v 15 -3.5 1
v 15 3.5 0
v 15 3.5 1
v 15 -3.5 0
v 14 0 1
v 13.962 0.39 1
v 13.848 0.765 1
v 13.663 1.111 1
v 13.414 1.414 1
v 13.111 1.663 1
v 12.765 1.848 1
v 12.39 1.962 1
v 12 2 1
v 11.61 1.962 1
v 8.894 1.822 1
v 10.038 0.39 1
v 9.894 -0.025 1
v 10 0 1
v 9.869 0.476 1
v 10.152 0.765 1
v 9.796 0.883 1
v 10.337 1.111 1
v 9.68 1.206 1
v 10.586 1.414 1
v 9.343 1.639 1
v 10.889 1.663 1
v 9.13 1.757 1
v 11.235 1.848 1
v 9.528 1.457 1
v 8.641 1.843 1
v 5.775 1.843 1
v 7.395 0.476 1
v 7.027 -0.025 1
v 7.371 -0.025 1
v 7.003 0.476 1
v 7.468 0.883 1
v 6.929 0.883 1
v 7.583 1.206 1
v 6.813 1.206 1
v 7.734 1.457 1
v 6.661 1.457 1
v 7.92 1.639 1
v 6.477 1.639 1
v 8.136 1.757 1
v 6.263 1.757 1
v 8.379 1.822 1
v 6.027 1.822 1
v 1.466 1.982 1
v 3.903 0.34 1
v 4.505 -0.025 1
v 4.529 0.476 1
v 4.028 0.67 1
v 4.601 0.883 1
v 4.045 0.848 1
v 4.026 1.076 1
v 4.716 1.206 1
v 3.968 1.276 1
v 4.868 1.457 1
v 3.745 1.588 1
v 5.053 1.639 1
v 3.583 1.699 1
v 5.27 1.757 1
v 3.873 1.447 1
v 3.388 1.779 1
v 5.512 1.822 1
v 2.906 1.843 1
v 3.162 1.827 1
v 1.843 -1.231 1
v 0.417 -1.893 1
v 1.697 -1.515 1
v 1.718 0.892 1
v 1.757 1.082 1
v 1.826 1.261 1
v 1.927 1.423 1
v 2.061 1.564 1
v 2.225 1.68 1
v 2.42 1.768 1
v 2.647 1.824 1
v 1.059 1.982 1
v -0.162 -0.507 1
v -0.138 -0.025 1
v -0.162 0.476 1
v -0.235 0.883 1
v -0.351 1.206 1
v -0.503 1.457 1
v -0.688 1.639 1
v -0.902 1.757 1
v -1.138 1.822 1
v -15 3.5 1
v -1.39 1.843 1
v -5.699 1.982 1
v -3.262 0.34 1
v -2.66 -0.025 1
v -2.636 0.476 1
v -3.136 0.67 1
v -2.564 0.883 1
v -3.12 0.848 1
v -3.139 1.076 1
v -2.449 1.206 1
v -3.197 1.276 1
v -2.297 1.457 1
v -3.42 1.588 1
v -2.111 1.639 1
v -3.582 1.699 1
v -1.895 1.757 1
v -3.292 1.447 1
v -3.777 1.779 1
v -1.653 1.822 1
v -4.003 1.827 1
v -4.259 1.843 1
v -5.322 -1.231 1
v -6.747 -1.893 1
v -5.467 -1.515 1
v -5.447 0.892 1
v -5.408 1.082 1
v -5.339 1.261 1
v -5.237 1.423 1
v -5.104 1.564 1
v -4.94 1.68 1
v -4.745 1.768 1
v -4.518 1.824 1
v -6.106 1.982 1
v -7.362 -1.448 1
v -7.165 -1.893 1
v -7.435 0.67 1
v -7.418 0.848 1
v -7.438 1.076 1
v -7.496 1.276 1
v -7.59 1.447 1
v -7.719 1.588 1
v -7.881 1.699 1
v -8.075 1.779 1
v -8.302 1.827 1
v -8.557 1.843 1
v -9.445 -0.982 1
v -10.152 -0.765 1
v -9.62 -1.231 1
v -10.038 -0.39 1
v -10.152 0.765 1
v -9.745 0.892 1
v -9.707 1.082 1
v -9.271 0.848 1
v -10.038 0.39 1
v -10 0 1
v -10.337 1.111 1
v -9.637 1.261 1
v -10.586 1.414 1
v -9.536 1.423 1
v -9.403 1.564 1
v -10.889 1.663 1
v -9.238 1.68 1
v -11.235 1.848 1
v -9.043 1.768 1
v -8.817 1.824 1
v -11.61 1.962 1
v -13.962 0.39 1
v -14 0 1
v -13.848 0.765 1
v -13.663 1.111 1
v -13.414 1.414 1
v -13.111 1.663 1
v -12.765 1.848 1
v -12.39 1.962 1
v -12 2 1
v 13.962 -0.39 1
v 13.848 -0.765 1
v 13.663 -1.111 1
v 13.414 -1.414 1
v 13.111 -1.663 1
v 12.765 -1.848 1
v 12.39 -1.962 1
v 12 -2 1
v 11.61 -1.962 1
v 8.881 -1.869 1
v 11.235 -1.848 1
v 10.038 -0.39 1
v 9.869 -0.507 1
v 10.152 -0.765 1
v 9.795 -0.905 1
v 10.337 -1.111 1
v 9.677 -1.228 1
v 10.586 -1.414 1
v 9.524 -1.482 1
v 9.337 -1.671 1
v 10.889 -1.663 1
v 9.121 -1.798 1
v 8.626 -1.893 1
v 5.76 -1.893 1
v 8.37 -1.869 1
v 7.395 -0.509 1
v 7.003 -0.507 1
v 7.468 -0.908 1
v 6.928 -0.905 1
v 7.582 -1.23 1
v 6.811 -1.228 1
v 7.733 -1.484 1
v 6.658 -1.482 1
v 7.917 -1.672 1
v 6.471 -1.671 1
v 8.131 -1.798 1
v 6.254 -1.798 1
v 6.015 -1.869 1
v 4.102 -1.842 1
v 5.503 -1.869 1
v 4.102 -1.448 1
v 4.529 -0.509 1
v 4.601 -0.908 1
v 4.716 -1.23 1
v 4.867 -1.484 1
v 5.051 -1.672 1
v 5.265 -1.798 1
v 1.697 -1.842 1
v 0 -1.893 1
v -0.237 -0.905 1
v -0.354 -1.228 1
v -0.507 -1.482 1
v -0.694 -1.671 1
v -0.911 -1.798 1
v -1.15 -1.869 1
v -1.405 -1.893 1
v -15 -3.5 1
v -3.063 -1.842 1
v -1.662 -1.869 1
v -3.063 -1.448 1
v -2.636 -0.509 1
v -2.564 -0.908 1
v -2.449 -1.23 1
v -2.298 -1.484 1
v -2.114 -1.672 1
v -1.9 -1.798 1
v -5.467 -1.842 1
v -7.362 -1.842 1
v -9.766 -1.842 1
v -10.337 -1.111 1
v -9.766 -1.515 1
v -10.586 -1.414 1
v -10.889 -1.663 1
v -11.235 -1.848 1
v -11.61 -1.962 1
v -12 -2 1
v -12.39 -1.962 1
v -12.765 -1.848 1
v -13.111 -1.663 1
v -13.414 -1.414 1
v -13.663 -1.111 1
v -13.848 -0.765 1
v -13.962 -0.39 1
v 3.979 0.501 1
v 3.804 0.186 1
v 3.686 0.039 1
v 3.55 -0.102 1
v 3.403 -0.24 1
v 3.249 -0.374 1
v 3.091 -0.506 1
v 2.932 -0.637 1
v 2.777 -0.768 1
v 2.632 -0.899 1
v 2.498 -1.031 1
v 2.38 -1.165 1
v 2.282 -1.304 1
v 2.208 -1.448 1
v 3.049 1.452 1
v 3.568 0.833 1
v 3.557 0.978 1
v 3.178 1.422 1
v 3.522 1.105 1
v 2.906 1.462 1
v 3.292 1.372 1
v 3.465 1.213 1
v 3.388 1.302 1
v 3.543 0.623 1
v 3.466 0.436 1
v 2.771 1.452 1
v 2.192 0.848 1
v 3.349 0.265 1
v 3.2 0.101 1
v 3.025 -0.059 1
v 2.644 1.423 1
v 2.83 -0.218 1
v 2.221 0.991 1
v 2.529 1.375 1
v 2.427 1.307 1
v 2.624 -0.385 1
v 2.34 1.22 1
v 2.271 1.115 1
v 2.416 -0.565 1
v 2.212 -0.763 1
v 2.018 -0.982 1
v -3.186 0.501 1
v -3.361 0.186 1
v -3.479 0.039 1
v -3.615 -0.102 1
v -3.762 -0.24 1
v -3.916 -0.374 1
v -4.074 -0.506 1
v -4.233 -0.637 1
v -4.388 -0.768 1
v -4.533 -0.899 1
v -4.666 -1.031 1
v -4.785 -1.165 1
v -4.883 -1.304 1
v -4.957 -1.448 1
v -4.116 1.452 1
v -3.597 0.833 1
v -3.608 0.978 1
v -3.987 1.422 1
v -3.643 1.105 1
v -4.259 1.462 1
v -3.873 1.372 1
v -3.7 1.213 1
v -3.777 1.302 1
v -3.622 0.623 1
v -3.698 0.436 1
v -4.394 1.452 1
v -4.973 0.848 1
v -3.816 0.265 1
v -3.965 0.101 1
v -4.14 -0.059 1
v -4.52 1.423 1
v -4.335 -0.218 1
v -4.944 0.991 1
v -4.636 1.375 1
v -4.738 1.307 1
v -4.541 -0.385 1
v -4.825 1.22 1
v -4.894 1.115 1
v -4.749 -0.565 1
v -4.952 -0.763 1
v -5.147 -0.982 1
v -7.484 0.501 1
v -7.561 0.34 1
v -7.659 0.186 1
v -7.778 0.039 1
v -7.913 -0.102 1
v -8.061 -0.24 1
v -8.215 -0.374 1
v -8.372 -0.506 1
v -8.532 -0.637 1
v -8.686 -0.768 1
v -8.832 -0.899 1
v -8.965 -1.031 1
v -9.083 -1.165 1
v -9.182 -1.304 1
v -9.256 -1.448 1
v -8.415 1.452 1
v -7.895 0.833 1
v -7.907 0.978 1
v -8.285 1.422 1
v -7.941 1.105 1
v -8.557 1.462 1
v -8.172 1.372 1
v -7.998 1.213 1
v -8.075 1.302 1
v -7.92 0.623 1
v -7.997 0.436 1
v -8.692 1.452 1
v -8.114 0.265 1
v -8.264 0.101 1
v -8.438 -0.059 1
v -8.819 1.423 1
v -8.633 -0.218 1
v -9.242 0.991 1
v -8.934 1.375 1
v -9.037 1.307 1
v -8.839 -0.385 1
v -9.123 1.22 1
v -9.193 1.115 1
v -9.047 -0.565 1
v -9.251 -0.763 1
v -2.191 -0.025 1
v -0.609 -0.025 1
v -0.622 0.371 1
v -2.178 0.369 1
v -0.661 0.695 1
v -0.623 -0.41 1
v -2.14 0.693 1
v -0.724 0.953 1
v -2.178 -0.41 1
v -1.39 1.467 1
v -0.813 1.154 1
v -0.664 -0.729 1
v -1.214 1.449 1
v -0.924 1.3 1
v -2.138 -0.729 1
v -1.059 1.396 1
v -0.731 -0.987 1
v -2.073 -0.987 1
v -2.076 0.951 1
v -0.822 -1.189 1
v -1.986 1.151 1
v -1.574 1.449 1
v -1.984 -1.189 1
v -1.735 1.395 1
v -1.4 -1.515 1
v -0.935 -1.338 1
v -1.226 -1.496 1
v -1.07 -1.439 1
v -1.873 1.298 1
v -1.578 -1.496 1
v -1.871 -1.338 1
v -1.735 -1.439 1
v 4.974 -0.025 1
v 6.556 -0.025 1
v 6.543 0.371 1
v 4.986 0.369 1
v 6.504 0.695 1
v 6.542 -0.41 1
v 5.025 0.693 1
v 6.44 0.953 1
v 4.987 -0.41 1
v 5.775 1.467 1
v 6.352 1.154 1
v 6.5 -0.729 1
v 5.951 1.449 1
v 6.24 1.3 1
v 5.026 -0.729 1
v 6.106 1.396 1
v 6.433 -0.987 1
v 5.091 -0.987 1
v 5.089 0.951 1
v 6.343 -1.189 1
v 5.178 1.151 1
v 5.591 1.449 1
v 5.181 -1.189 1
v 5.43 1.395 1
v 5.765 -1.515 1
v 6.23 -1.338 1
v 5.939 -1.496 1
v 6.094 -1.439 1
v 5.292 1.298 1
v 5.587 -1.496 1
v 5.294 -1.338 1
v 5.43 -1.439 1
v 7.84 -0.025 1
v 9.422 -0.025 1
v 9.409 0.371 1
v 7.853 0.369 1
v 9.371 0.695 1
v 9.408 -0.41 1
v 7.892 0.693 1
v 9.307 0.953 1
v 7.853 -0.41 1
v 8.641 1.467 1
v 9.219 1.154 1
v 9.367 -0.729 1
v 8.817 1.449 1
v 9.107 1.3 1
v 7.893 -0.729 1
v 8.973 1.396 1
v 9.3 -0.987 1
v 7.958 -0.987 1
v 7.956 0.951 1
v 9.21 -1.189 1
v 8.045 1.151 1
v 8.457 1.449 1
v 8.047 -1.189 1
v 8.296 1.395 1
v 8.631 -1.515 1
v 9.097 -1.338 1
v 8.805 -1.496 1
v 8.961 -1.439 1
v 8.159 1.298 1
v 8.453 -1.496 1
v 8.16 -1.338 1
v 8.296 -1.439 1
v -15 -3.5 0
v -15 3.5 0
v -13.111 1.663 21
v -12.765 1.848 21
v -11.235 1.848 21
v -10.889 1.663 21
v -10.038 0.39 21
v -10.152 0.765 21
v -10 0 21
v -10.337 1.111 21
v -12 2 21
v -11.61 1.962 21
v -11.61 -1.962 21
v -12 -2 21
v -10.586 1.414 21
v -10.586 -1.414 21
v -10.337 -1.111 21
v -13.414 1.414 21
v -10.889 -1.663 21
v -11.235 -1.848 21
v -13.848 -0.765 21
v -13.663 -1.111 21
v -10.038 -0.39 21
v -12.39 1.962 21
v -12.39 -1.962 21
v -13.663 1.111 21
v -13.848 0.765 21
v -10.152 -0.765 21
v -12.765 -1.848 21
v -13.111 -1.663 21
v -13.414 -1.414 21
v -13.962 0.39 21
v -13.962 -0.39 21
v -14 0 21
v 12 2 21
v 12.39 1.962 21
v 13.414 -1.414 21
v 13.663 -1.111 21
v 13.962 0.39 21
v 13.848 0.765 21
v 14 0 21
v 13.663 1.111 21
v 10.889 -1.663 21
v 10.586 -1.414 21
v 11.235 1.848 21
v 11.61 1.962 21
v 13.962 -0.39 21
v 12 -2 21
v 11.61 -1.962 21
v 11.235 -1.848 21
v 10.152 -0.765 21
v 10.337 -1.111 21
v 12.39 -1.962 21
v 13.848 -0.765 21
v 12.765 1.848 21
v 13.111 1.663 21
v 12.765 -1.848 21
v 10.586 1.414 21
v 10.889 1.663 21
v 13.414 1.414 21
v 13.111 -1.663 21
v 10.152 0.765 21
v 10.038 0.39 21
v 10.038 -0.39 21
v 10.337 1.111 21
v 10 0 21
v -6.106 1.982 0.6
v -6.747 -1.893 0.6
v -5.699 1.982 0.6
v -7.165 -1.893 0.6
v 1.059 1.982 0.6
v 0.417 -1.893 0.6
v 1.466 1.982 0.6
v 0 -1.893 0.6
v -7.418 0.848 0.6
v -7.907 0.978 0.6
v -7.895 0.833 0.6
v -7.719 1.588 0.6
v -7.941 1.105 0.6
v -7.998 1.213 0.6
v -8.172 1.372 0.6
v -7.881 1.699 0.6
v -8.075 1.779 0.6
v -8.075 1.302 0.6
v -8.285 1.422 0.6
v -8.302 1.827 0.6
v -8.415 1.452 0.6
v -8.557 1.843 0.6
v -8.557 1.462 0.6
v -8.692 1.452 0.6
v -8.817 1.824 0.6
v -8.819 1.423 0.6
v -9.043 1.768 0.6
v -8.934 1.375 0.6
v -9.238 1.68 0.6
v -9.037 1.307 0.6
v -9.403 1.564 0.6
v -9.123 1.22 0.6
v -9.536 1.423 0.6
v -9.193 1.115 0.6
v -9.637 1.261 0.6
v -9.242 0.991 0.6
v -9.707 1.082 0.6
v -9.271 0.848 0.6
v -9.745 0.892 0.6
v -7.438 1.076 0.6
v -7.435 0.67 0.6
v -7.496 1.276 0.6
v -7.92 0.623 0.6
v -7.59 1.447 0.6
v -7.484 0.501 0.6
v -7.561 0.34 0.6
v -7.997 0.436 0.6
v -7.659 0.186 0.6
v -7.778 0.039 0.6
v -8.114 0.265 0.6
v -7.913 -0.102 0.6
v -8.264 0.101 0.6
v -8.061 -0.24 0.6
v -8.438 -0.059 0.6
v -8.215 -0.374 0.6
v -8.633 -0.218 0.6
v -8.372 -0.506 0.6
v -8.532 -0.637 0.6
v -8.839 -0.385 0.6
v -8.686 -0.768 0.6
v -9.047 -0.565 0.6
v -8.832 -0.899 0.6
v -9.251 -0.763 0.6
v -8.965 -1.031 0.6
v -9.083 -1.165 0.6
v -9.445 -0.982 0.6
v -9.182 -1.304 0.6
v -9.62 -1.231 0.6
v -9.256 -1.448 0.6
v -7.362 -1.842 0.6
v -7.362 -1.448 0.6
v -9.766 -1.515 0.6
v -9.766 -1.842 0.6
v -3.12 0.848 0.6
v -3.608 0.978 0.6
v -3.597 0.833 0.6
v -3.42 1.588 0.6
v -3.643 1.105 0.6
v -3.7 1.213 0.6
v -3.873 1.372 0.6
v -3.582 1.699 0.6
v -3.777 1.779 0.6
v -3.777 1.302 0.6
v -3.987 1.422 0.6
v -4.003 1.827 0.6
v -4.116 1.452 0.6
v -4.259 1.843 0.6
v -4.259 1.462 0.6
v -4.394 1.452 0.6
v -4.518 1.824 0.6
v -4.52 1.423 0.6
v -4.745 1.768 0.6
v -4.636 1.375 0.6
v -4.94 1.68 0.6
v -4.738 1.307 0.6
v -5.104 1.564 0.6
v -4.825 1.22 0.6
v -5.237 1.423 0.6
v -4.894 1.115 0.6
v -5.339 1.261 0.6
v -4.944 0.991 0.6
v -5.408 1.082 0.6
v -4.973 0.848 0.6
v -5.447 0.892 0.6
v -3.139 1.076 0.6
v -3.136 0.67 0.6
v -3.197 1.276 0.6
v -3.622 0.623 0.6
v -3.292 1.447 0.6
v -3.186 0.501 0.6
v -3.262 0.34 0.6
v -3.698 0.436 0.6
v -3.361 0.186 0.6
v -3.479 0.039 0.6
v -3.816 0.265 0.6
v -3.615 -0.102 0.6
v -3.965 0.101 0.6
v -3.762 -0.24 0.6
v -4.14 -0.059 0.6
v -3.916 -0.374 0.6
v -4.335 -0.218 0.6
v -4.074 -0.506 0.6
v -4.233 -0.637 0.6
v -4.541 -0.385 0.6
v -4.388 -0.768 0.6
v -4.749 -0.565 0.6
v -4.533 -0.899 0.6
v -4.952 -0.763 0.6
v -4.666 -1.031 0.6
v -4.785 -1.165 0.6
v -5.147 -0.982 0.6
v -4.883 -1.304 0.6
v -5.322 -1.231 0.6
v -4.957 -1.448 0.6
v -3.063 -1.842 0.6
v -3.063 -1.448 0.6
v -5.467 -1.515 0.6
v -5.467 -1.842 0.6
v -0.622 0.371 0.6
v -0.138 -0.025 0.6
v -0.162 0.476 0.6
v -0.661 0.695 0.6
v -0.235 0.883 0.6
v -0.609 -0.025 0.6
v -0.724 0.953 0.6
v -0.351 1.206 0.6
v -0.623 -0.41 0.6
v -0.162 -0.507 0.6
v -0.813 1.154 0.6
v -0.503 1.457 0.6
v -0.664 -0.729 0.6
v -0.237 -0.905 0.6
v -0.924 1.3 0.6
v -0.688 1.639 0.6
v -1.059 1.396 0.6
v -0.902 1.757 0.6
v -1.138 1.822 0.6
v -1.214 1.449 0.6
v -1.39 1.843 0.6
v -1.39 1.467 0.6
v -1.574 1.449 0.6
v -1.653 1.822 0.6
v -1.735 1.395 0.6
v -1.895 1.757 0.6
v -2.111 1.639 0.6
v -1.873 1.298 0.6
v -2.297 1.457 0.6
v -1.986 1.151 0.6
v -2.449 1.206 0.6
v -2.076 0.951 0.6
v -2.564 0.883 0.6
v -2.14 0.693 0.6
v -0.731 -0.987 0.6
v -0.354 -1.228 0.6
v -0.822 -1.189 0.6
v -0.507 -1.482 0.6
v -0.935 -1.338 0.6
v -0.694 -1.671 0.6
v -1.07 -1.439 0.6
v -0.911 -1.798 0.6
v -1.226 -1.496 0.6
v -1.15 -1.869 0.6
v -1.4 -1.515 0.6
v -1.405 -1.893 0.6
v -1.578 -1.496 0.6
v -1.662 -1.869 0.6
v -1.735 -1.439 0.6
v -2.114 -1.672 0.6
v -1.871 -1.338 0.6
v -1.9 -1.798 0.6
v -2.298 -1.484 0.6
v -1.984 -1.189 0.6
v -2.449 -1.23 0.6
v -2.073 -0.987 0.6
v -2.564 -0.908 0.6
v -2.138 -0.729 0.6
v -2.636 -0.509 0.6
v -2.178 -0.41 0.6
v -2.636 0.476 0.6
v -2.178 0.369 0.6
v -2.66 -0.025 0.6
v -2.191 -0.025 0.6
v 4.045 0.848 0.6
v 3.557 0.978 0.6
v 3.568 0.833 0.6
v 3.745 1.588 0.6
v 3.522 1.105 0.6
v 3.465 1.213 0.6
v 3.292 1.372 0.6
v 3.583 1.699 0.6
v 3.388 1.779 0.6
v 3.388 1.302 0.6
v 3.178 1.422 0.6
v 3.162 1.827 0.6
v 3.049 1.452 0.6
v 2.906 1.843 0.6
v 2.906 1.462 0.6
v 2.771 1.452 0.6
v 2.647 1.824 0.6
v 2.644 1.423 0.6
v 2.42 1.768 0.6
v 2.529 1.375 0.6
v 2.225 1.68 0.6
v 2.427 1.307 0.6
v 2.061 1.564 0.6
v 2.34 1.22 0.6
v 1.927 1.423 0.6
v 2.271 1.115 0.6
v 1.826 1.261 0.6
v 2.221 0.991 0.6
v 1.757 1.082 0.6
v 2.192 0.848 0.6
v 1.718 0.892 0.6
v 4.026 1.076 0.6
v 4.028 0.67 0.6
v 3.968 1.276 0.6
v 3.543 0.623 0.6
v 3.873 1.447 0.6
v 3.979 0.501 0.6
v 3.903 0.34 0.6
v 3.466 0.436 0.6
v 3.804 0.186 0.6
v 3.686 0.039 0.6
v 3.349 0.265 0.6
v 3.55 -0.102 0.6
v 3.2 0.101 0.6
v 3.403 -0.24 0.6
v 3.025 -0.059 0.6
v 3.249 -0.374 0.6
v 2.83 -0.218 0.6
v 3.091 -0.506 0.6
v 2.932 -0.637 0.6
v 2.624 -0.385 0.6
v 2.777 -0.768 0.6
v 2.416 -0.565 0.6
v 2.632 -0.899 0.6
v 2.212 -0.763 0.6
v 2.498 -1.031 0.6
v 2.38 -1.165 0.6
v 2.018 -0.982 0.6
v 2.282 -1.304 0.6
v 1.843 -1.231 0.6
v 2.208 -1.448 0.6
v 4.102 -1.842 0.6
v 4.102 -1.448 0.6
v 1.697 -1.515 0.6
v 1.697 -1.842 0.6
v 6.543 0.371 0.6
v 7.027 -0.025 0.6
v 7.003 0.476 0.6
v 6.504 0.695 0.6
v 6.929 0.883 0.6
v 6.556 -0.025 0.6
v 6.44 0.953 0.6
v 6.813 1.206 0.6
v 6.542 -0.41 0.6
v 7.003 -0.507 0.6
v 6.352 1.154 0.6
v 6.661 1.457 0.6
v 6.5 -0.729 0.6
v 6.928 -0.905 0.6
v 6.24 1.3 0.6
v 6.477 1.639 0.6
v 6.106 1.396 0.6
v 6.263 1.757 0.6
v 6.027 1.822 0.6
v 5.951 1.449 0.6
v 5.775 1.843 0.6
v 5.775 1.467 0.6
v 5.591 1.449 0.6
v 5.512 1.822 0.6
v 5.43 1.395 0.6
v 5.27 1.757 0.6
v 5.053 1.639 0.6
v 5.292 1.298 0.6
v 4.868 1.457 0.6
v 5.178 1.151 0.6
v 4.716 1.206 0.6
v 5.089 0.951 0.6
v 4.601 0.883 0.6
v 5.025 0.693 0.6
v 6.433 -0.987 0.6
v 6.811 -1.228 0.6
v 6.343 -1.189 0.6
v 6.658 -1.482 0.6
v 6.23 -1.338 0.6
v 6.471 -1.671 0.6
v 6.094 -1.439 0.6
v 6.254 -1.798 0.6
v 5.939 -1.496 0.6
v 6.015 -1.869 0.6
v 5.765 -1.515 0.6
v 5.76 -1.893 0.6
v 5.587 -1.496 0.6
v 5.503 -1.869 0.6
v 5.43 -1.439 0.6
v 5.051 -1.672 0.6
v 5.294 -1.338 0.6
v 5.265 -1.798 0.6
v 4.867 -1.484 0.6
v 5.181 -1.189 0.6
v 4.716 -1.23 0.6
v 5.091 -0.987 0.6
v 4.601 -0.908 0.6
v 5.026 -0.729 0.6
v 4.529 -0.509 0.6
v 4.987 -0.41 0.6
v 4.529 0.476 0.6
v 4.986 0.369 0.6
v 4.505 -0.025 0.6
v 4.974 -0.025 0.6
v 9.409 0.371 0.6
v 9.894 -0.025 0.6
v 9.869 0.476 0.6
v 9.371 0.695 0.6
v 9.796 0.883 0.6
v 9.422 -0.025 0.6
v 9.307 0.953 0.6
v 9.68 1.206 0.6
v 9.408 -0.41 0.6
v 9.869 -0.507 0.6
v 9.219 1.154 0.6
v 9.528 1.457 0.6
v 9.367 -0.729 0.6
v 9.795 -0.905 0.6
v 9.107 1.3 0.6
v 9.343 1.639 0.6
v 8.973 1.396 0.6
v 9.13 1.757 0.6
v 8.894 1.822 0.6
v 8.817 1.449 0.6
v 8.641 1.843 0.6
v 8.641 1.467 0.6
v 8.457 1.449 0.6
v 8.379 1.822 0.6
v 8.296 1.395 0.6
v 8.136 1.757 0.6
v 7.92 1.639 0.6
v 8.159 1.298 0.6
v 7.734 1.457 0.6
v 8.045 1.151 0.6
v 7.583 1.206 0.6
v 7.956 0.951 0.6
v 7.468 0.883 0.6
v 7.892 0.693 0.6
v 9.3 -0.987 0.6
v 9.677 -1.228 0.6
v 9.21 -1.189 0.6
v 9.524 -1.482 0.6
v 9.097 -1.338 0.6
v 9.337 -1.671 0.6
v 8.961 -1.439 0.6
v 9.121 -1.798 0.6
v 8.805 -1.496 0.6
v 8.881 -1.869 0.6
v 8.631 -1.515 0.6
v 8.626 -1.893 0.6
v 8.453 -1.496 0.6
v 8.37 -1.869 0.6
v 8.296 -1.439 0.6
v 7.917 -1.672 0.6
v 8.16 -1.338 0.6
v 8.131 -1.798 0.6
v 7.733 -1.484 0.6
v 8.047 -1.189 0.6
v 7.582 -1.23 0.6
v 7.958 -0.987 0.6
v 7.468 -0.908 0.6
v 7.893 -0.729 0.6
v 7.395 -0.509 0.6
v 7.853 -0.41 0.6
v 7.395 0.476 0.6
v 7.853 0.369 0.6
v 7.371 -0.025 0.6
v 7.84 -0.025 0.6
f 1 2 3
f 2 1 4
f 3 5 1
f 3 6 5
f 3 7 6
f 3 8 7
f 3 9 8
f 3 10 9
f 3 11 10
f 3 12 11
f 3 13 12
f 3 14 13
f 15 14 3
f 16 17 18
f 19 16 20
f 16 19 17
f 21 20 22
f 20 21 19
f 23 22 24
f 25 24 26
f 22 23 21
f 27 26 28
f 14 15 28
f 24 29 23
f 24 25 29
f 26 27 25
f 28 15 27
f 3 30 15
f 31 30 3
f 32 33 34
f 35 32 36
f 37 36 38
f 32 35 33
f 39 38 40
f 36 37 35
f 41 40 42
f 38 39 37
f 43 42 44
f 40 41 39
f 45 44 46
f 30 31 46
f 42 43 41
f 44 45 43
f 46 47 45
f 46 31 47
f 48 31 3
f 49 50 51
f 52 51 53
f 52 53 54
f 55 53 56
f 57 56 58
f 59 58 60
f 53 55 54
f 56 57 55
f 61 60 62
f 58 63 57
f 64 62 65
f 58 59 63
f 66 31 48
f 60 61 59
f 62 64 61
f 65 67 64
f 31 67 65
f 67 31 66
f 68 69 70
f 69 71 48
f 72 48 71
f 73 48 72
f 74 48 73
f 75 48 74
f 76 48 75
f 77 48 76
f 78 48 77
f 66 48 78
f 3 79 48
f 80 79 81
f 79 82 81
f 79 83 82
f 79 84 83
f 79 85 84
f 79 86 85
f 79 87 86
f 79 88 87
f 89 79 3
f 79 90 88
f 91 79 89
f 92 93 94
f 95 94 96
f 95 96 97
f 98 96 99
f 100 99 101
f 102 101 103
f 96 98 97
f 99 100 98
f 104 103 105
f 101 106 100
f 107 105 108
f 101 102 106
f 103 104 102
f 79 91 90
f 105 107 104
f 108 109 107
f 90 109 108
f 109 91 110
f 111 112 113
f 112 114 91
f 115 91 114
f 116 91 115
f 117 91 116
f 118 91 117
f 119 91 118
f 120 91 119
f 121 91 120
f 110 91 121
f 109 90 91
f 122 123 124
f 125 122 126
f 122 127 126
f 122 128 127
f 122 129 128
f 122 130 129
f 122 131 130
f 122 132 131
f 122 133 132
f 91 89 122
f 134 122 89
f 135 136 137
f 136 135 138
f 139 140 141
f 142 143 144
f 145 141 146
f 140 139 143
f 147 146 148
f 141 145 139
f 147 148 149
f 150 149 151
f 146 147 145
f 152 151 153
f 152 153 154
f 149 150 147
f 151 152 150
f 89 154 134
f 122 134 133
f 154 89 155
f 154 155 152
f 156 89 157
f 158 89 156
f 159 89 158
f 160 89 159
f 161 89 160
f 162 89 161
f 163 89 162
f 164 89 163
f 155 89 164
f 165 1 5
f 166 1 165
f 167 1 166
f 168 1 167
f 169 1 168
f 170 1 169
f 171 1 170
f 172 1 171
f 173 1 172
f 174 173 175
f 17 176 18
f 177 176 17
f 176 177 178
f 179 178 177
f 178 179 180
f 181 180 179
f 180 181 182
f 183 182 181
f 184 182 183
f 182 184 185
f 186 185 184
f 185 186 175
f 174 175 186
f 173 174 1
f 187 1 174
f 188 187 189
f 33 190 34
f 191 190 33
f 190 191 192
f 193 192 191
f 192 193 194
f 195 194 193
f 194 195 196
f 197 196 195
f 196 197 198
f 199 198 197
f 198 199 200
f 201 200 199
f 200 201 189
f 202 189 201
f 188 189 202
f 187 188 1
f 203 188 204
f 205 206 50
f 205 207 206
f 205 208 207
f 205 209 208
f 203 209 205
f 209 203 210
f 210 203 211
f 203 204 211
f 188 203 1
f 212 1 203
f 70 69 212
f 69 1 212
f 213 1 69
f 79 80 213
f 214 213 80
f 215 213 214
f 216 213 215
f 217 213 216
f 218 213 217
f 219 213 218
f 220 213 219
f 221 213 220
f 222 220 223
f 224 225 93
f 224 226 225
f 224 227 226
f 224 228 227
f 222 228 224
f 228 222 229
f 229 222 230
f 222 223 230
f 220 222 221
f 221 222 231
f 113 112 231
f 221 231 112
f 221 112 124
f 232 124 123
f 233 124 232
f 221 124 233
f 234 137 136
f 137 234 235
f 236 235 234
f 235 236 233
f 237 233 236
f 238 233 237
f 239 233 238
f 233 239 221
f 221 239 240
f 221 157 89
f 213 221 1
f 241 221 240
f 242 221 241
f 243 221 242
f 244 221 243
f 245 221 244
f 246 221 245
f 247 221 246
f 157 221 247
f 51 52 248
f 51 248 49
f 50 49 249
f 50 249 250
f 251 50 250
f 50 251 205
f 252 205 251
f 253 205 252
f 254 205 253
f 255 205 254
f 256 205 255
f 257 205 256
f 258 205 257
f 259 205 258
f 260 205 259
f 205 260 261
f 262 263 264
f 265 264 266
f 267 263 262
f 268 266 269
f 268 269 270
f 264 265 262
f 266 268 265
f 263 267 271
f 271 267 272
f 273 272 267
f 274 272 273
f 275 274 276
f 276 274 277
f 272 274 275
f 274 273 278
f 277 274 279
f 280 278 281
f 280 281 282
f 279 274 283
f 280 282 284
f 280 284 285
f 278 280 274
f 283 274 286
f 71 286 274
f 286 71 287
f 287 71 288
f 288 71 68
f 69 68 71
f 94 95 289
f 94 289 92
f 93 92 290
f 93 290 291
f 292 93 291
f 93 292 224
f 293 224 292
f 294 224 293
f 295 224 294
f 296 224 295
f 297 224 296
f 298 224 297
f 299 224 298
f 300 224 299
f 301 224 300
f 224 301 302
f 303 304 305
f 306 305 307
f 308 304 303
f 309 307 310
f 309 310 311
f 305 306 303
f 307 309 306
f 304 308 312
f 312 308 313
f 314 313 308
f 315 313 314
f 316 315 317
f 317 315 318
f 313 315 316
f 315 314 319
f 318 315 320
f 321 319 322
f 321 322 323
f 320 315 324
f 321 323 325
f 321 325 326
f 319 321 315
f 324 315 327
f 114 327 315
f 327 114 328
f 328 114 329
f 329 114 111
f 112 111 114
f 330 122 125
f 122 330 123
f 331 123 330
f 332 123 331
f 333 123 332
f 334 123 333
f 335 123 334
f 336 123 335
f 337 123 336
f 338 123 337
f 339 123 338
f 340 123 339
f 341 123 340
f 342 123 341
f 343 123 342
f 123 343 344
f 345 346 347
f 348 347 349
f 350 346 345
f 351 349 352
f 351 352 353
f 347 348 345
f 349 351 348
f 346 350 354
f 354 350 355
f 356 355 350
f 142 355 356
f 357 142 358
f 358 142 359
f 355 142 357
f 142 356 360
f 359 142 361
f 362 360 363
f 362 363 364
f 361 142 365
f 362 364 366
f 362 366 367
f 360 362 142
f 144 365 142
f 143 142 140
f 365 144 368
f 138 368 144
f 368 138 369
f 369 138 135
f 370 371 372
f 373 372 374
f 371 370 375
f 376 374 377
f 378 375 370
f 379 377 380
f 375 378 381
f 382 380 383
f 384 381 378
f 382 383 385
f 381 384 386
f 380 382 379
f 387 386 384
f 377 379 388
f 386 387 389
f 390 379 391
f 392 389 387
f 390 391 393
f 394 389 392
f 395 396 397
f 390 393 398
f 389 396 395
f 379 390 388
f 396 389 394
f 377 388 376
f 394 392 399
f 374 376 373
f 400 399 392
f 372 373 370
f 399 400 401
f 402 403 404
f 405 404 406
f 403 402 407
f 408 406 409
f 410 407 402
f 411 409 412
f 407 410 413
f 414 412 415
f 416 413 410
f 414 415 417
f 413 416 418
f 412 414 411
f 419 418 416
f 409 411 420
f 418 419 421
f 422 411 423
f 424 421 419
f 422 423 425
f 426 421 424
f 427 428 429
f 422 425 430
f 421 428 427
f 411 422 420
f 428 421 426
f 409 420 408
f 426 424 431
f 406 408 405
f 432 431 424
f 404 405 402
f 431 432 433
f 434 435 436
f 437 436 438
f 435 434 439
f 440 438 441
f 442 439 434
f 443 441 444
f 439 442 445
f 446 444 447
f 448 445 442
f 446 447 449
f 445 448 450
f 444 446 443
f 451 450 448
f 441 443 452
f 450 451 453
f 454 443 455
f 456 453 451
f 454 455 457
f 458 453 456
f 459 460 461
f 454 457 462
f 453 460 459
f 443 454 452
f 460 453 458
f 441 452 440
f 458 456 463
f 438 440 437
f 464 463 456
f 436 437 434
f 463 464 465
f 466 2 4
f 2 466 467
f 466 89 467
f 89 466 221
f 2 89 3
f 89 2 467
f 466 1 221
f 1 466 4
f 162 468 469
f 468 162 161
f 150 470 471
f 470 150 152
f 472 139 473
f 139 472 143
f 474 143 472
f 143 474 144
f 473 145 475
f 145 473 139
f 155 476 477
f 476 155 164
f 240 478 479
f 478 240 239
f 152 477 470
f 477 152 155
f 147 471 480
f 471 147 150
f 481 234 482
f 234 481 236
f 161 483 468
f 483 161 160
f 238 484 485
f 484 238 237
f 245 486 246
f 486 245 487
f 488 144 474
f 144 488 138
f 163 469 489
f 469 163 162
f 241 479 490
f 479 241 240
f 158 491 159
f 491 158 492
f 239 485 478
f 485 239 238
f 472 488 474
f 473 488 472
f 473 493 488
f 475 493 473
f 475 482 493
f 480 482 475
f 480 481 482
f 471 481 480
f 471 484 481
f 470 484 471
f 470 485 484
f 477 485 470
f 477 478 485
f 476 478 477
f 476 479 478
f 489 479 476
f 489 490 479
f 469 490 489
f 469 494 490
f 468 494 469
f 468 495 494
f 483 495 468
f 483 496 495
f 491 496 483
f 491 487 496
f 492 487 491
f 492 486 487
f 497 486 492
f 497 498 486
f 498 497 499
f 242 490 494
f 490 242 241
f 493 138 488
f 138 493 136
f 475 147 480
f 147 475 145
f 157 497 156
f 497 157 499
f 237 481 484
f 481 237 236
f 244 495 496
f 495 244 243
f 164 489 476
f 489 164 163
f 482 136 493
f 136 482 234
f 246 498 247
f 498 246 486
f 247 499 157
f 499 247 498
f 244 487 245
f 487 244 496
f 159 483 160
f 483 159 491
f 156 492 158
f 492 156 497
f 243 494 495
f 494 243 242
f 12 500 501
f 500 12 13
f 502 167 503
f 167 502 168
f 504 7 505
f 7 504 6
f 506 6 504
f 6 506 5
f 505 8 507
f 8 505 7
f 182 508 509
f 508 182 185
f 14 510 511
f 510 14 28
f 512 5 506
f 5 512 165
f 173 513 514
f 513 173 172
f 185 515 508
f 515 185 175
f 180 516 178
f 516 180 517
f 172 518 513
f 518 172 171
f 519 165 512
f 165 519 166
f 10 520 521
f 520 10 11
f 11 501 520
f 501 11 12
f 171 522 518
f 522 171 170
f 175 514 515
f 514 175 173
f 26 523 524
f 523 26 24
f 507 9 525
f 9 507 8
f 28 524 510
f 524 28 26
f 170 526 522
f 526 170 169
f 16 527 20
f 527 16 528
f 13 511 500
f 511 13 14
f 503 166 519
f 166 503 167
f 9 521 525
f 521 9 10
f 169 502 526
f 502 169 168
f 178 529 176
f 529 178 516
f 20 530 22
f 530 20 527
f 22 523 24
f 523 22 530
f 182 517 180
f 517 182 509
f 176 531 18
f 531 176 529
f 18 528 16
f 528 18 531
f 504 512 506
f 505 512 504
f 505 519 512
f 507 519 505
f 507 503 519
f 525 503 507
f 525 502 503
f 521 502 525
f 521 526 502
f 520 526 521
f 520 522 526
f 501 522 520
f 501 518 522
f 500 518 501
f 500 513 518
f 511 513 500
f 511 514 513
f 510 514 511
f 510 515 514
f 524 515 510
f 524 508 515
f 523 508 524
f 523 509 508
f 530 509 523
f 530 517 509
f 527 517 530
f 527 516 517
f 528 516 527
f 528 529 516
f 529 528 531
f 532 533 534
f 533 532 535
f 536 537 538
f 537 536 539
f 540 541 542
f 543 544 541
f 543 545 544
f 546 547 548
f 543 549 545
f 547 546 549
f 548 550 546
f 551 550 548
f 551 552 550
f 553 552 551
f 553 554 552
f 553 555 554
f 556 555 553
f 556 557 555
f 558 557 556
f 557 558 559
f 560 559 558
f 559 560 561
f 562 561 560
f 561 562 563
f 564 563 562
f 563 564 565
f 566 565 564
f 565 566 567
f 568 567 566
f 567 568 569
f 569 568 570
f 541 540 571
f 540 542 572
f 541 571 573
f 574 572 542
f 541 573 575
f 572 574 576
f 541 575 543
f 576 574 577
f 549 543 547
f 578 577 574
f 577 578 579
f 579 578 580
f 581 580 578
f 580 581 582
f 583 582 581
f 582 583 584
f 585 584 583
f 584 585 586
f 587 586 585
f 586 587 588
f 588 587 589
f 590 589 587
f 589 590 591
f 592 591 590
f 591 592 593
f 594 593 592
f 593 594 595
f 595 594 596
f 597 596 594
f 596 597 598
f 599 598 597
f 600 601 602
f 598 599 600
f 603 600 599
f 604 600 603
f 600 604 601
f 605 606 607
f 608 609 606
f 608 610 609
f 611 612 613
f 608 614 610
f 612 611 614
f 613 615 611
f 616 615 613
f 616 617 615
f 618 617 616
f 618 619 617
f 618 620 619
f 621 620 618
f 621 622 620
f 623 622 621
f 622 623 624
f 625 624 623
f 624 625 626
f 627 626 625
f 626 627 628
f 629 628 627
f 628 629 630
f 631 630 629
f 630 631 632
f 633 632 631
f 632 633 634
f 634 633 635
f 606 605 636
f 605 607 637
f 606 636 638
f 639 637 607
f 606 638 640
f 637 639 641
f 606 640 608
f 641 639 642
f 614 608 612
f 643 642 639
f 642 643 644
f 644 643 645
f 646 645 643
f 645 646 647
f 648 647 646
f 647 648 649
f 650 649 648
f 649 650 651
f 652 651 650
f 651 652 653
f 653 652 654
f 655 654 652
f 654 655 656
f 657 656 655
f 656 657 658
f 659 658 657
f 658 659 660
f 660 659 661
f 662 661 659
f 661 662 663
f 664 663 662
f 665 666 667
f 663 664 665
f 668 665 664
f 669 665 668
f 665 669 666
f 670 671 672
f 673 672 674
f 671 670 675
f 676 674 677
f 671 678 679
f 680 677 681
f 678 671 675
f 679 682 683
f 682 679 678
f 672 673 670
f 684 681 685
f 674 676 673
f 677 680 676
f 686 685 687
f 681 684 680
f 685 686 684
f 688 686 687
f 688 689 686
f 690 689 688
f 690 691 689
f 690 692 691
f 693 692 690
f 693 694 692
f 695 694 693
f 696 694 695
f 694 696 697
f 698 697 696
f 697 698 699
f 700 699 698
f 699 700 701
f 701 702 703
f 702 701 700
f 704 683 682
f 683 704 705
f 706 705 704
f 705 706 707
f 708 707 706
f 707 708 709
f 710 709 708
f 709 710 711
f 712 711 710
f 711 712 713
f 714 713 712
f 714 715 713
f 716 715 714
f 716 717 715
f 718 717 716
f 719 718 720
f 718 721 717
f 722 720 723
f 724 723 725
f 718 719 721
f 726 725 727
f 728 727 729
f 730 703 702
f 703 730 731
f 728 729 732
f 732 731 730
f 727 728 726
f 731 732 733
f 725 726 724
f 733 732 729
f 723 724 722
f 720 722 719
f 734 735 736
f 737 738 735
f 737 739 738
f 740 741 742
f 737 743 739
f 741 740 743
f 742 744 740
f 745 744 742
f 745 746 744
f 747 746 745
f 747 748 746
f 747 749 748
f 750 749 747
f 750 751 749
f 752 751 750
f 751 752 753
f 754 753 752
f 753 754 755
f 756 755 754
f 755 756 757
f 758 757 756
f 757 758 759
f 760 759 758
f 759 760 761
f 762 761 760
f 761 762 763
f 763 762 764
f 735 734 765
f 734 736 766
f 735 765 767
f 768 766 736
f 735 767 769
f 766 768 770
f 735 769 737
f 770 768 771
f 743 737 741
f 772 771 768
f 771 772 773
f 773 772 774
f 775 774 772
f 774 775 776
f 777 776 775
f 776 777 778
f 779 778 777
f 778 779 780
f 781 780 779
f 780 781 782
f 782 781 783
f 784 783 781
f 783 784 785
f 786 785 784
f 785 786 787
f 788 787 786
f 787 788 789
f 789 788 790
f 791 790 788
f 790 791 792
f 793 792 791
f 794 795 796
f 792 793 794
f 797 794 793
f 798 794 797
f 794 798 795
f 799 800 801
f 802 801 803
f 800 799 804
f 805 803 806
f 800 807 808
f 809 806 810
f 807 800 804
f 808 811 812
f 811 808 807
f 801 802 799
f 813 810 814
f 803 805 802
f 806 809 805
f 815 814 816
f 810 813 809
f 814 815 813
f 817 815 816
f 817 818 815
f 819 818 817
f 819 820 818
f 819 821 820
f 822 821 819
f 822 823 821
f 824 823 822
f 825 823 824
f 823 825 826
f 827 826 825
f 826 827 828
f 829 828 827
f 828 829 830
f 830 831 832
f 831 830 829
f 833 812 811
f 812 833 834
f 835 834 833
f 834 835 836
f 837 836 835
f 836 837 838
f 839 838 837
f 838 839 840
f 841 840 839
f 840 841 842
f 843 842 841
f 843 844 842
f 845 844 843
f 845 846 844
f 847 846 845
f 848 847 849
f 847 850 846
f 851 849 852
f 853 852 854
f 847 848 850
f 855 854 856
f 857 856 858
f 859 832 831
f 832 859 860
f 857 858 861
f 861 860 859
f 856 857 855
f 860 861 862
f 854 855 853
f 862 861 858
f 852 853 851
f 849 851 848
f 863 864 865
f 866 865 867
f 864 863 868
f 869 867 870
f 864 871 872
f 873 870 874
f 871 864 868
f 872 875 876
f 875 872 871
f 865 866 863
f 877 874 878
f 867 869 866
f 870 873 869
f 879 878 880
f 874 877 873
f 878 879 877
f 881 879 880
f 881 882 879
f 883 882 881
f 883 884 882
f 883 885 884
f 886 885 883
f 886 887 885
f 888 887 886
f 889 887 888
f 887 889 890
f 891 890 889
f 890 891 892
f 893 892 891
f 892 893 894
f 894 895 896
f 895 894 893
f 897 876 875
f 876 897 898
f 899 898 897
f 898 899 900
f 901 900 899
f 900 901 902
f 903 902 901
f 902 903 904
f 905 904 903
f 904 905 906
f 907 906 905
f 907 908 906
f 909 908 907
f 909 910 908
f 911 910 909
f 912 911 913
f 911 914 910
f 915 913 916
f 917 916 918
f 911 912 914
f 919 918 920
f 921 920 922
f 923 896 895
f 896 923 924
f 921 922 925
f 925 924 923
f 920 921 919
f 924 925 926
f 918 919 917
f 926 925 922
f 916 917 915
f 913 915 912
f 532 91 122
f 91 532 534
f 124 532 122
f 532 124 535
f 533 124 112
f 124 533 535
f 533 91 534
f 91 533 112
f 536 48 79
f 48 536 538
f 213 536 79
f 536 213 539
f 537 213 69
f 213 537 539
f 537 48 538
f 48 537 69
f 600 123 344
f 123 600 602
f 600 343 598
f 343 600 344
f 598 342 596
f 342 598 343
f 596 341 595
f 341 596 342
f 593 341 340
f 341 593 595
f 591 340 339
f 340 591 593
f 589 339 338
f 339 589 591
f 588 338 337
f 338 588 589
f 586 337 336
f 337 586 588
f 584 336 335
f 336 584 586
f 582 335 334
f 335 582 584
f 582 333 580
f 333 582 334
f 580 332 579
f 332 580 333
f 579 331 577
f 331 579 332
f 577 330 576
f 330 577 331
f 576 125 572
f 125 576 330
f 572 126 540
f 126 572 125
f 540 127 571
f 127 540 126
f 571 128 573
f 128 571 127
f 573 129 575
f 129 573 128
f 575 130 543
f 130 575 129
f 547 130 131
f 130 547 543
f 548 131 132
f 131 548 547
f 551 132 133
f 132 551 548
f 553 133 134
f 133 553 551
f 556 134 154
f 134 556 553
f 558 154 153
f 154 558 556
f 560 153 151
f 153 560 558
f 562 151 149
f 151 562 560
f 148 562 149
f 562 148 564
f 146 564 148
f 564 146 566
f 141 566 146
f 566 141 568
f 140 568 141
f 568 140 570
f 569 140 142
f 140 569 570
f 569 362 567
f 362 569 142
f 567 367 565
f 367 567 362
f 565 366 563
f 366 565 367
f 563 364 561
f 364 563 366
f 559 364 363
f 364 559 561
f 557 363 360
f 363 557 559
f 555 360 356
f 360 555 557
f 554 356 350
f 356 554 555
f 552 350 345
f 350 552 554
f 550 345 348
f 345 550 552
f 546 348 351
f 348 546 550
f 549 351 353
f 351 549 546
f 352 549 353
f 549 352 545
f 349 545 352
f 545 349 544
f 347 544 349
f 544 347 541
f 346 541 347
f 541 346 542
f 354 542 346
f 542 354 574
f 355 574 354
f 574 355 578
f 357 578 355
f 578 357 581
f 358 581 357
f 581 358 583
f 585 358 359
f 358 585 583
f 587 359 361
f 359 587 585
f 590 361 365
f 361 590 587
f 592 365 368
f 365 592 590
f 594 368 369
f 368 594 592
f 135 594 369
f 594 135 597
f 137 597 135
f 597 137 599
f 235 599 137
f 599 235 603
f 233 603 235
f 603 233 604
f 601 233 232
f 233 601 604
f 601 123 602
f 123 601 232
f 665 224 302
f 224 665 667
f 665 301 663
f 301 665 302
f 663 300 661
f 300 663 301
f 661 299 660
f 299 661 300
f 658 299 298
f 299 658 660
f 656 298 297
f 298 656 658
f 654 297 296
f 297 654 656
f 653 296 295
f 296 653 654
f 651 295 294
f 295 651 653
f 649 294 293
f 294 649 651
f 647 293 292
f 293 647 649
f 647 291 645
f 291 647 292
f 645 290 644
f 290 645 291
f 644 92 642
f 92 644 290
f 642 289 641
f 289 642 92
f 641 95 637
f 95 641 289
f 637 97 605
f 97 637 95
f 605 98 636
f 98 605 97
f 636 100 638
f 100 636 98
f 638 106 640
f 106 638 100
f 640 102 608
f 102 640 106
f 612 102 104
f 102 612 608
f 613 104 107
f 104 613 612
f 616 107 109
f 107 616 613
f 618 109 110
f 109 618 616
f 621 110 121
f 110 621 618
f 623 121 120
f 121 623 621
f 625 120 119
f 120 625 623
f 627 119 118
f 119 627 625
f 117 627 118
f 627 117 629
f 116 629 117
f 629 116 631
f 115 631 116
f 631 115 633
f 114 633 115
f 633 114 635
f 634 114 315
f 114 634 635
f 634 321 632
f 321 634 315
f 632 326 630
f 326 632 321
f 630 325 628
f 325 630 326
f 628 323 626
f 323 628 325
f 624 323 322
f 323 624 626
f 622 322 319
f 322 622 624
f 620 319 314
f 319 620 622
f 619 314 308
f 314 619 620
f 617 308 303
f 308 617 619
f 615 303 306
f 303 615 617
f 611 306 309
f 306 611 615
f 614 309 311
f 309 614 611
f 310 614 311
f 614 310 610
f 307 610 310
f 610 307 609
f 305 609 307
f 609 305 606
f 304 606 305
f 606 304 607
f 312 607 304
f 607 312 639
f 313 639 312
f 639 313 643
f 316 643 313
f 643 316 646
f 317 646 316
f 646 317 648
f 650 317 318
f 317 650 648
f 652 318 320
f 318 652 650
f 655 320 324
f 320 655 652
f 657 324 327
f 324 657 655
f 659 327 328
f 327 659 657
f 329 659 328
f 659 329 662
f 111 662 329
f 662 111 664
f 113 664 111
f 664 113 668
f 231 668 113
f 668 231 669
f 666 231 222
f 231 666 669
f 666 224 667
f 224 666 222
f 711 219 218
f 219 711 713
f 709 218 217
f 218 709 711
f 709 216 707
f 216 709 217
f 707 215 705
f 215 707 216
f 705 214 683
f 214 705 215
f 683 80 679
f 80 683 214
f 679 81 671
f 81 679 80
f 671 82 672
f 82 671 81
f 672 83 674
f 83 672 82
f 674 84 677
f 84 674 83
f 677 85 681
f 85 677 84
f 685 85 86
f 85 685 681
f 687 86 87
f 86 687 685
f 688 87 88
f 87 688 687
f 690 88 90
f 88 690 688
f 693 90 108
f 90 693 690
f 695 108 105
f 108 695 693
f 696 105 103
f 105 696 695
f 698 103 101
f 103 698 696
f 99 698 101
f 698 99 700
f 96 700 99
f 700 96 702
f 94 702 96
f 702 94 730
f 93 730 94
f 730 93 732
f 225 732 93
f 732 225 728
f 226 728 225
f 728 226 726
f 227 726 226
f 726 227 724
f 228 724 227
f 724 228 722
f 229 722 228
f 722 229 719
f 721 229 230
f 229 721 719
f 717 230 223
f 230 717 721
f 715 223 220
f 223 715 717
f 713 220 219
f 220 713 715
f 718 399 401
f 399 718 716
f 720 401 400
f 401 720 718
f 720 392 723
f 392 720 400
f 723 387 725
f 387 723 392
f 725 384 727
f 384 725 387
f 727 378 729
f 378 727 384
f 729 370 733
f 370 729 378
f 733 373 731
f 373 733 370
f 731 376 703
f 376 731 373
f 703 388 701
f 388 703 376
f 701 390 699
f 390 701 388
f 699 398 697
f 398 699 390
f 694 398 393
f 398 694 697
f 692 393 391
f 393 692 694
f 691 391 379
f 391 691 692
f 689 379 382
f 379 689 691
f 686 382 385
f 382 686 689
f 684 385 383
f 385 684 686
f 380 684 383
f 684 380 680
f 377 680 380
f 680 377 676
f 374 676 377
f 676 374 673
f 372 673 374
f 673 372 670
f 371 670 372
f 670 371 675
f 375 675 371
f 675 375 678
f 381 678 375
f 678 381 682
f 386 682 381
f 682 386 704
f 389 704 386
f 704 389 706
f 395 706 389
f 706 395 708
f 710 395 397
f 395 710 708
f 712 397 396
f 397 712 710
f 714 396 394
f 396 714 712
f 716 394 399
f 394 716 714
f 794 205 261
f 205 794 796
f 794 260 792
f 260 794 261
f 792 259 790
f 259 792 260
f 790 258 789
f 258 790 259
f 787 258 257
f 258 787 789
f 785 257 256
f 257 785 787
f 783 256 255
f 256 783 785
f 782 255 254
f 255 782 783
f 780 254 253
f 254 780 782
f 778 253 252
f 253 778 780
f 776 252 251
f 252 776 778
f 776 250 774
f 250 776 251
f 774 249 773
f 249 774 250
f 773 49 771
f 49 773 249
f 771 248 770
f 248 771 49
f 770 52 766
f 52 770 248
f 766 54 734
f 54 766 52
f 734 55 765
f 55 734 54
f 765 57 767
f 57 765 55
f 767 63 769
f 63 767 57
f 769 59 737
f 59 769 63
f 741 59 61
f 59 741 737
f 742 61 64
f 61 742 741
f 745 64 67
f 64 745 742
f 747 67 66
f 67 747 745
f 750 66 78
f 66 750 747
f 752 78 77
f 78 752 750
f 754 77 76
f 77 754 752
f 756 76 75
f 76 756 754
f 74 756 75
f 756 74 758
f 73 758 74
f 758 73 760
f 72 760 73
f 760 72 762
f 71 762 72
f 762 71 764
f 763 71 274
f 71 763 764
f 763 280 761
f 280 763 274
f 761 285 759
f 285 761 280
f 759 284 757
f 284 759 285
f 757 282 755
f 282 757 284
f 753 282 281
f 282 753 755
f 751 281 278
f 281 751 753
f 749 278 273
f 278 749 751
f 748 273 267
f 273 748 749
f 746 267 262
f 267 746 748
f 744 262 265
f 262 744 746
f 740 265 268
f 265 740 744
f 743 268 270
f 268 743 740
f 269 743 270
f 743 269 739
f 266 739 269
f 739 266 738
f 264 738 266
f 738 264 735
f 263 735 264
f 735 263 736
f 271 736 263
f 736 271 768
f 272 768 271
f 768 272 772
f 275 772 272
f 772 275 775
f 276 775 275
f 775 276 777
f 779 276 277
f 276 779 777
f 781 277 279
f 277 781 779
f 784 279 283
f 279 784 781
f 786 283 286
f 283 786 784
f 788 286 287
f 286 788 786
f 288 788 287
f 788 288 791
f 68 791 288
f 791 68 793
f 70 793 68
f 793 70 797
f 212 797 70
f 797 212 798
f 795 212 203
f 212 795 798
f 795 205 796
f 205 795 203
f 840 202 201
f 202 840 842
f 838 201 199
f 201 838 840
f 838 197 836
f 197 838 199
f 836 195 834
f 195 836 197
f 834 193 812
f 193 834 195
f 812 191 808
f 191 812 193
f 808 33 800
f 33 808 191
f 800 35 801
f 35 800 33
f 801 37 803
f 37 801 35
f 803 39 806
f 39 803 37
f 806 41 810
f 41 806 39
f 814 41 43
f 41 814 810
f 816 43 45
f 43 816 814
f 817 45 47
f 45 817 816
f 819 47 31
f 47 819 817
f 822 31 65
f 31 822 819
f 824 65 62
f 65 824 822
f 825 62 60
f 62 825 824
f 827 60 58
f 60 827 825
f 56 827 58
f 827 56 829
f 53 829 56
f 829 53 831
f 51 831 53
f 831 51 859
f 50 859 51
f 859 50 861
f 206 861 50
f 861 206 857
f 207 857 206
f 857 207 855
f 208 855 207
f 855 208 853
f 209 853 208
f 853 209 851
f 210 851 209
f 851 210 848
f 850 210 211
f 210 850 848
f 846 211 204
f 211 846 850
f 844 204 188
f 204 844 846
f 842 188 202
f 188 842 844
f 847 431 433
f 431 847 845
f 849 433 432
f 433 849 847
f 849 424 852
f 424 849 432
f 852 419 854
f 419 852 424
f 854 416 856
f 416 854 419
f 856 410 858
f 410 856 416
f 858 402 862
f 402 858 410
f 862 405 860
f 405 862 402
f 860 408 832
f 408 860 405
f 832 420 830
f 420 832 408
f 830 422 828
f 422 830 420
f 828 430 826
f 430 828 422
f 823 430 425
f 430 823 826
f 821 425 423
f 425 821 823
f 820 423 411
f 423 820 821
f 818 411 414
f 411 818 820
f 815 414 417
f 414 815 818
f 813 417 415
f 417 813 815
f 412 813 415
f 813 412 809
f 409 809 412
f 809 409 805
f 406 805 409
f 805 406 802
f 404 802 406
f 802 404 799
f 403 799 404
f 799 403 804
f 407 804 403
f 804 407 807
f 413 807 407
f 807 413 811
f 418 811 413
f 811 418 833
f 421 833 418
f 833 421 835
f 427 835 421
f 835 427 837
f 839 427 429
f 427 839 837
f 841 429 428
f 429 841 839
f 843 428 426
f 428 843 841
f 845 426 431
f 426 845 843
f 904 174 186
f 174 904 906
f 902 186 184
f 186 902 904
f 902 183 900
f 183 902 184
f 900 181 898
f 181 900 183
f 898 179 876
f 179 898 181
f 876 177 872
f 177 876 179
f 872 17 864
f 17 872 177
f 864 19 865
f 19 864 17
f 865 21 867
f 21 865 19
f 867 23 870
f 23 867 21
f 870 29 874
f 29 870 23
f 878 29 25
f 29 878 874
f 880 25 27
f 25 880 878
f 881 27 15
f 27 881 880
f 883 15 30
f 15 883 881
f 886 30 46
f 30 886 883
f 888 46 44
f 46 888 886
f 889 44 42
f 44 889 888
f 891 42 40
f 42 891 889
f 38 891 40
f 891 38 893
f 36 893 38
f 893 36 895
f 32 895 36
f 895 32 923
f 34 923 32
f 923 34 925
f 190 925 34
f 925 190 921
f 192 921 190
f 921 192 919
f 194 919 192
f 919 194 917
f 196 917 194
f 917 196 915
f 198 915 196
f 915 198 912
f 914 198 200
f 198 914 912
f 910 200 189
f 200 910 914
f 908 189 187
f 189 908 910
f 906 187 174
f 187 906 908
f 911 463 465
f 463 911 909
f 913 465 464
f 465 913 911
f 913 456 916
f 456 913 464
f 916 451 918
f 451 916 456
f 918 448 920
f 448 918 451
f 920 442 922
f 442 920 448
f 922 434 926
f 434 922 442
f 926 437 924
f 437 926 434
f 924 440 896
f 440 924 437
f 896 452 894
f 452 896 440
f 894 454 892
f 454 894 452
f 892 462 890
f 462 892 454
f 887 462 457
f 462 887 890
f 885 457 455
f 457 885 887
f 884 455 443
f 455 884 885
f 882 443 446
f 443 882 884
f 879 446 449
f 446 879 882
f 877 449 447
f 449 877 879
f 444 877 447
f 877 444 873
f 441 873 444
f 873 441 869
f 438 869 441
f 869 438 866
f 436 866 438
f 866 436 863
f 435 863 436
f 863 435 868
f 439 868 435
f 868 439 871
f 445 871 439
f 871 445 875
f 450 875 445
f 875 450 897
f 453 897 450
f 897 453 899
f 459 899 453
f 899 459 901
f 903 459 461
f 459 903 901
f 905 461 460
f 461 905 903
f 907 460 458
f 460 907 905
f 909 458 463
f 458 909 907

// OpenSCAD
/* [Dimensions] */
// Cylinder diameter
diameter = 4;
// Cylinder height
height = 20;
// Distance betwen the two cylinders
separation = 20;
// Cylinder to edge distance
edge = 1;
// Base thickness
thickness = 1;

/* [Text] */
// Retraction settings:
//"RetractionDistance/RetractionSpeed/TravelSpeed"
settings = "2/20/200";
textSize = 3.8;
textDepth = 0.4;

/* [Hidden] */
length = separation+2*diameter+2*edge;
width = diameter+1.5*2*edge;


difference(){
  
  union(){
    
    translate([-length/2,-width/2,0])
      cube([length,width,thickness]);

    translate([-length/2+diameter/2+edge,0,thickness])
      cylinder(r=diameter/2, h=height, $fn=32);

    translate([length/2-diameter/2-edge,0,thickness])
      cylinder(r=diameter/2, h=height, $fn=32);
  
  }

  translate([0,0,thickness-textDepth])
    linear_extrude(height = textDepth+0.1)
      text(settings, size=textSize , halign="center", valign ="center");

}
